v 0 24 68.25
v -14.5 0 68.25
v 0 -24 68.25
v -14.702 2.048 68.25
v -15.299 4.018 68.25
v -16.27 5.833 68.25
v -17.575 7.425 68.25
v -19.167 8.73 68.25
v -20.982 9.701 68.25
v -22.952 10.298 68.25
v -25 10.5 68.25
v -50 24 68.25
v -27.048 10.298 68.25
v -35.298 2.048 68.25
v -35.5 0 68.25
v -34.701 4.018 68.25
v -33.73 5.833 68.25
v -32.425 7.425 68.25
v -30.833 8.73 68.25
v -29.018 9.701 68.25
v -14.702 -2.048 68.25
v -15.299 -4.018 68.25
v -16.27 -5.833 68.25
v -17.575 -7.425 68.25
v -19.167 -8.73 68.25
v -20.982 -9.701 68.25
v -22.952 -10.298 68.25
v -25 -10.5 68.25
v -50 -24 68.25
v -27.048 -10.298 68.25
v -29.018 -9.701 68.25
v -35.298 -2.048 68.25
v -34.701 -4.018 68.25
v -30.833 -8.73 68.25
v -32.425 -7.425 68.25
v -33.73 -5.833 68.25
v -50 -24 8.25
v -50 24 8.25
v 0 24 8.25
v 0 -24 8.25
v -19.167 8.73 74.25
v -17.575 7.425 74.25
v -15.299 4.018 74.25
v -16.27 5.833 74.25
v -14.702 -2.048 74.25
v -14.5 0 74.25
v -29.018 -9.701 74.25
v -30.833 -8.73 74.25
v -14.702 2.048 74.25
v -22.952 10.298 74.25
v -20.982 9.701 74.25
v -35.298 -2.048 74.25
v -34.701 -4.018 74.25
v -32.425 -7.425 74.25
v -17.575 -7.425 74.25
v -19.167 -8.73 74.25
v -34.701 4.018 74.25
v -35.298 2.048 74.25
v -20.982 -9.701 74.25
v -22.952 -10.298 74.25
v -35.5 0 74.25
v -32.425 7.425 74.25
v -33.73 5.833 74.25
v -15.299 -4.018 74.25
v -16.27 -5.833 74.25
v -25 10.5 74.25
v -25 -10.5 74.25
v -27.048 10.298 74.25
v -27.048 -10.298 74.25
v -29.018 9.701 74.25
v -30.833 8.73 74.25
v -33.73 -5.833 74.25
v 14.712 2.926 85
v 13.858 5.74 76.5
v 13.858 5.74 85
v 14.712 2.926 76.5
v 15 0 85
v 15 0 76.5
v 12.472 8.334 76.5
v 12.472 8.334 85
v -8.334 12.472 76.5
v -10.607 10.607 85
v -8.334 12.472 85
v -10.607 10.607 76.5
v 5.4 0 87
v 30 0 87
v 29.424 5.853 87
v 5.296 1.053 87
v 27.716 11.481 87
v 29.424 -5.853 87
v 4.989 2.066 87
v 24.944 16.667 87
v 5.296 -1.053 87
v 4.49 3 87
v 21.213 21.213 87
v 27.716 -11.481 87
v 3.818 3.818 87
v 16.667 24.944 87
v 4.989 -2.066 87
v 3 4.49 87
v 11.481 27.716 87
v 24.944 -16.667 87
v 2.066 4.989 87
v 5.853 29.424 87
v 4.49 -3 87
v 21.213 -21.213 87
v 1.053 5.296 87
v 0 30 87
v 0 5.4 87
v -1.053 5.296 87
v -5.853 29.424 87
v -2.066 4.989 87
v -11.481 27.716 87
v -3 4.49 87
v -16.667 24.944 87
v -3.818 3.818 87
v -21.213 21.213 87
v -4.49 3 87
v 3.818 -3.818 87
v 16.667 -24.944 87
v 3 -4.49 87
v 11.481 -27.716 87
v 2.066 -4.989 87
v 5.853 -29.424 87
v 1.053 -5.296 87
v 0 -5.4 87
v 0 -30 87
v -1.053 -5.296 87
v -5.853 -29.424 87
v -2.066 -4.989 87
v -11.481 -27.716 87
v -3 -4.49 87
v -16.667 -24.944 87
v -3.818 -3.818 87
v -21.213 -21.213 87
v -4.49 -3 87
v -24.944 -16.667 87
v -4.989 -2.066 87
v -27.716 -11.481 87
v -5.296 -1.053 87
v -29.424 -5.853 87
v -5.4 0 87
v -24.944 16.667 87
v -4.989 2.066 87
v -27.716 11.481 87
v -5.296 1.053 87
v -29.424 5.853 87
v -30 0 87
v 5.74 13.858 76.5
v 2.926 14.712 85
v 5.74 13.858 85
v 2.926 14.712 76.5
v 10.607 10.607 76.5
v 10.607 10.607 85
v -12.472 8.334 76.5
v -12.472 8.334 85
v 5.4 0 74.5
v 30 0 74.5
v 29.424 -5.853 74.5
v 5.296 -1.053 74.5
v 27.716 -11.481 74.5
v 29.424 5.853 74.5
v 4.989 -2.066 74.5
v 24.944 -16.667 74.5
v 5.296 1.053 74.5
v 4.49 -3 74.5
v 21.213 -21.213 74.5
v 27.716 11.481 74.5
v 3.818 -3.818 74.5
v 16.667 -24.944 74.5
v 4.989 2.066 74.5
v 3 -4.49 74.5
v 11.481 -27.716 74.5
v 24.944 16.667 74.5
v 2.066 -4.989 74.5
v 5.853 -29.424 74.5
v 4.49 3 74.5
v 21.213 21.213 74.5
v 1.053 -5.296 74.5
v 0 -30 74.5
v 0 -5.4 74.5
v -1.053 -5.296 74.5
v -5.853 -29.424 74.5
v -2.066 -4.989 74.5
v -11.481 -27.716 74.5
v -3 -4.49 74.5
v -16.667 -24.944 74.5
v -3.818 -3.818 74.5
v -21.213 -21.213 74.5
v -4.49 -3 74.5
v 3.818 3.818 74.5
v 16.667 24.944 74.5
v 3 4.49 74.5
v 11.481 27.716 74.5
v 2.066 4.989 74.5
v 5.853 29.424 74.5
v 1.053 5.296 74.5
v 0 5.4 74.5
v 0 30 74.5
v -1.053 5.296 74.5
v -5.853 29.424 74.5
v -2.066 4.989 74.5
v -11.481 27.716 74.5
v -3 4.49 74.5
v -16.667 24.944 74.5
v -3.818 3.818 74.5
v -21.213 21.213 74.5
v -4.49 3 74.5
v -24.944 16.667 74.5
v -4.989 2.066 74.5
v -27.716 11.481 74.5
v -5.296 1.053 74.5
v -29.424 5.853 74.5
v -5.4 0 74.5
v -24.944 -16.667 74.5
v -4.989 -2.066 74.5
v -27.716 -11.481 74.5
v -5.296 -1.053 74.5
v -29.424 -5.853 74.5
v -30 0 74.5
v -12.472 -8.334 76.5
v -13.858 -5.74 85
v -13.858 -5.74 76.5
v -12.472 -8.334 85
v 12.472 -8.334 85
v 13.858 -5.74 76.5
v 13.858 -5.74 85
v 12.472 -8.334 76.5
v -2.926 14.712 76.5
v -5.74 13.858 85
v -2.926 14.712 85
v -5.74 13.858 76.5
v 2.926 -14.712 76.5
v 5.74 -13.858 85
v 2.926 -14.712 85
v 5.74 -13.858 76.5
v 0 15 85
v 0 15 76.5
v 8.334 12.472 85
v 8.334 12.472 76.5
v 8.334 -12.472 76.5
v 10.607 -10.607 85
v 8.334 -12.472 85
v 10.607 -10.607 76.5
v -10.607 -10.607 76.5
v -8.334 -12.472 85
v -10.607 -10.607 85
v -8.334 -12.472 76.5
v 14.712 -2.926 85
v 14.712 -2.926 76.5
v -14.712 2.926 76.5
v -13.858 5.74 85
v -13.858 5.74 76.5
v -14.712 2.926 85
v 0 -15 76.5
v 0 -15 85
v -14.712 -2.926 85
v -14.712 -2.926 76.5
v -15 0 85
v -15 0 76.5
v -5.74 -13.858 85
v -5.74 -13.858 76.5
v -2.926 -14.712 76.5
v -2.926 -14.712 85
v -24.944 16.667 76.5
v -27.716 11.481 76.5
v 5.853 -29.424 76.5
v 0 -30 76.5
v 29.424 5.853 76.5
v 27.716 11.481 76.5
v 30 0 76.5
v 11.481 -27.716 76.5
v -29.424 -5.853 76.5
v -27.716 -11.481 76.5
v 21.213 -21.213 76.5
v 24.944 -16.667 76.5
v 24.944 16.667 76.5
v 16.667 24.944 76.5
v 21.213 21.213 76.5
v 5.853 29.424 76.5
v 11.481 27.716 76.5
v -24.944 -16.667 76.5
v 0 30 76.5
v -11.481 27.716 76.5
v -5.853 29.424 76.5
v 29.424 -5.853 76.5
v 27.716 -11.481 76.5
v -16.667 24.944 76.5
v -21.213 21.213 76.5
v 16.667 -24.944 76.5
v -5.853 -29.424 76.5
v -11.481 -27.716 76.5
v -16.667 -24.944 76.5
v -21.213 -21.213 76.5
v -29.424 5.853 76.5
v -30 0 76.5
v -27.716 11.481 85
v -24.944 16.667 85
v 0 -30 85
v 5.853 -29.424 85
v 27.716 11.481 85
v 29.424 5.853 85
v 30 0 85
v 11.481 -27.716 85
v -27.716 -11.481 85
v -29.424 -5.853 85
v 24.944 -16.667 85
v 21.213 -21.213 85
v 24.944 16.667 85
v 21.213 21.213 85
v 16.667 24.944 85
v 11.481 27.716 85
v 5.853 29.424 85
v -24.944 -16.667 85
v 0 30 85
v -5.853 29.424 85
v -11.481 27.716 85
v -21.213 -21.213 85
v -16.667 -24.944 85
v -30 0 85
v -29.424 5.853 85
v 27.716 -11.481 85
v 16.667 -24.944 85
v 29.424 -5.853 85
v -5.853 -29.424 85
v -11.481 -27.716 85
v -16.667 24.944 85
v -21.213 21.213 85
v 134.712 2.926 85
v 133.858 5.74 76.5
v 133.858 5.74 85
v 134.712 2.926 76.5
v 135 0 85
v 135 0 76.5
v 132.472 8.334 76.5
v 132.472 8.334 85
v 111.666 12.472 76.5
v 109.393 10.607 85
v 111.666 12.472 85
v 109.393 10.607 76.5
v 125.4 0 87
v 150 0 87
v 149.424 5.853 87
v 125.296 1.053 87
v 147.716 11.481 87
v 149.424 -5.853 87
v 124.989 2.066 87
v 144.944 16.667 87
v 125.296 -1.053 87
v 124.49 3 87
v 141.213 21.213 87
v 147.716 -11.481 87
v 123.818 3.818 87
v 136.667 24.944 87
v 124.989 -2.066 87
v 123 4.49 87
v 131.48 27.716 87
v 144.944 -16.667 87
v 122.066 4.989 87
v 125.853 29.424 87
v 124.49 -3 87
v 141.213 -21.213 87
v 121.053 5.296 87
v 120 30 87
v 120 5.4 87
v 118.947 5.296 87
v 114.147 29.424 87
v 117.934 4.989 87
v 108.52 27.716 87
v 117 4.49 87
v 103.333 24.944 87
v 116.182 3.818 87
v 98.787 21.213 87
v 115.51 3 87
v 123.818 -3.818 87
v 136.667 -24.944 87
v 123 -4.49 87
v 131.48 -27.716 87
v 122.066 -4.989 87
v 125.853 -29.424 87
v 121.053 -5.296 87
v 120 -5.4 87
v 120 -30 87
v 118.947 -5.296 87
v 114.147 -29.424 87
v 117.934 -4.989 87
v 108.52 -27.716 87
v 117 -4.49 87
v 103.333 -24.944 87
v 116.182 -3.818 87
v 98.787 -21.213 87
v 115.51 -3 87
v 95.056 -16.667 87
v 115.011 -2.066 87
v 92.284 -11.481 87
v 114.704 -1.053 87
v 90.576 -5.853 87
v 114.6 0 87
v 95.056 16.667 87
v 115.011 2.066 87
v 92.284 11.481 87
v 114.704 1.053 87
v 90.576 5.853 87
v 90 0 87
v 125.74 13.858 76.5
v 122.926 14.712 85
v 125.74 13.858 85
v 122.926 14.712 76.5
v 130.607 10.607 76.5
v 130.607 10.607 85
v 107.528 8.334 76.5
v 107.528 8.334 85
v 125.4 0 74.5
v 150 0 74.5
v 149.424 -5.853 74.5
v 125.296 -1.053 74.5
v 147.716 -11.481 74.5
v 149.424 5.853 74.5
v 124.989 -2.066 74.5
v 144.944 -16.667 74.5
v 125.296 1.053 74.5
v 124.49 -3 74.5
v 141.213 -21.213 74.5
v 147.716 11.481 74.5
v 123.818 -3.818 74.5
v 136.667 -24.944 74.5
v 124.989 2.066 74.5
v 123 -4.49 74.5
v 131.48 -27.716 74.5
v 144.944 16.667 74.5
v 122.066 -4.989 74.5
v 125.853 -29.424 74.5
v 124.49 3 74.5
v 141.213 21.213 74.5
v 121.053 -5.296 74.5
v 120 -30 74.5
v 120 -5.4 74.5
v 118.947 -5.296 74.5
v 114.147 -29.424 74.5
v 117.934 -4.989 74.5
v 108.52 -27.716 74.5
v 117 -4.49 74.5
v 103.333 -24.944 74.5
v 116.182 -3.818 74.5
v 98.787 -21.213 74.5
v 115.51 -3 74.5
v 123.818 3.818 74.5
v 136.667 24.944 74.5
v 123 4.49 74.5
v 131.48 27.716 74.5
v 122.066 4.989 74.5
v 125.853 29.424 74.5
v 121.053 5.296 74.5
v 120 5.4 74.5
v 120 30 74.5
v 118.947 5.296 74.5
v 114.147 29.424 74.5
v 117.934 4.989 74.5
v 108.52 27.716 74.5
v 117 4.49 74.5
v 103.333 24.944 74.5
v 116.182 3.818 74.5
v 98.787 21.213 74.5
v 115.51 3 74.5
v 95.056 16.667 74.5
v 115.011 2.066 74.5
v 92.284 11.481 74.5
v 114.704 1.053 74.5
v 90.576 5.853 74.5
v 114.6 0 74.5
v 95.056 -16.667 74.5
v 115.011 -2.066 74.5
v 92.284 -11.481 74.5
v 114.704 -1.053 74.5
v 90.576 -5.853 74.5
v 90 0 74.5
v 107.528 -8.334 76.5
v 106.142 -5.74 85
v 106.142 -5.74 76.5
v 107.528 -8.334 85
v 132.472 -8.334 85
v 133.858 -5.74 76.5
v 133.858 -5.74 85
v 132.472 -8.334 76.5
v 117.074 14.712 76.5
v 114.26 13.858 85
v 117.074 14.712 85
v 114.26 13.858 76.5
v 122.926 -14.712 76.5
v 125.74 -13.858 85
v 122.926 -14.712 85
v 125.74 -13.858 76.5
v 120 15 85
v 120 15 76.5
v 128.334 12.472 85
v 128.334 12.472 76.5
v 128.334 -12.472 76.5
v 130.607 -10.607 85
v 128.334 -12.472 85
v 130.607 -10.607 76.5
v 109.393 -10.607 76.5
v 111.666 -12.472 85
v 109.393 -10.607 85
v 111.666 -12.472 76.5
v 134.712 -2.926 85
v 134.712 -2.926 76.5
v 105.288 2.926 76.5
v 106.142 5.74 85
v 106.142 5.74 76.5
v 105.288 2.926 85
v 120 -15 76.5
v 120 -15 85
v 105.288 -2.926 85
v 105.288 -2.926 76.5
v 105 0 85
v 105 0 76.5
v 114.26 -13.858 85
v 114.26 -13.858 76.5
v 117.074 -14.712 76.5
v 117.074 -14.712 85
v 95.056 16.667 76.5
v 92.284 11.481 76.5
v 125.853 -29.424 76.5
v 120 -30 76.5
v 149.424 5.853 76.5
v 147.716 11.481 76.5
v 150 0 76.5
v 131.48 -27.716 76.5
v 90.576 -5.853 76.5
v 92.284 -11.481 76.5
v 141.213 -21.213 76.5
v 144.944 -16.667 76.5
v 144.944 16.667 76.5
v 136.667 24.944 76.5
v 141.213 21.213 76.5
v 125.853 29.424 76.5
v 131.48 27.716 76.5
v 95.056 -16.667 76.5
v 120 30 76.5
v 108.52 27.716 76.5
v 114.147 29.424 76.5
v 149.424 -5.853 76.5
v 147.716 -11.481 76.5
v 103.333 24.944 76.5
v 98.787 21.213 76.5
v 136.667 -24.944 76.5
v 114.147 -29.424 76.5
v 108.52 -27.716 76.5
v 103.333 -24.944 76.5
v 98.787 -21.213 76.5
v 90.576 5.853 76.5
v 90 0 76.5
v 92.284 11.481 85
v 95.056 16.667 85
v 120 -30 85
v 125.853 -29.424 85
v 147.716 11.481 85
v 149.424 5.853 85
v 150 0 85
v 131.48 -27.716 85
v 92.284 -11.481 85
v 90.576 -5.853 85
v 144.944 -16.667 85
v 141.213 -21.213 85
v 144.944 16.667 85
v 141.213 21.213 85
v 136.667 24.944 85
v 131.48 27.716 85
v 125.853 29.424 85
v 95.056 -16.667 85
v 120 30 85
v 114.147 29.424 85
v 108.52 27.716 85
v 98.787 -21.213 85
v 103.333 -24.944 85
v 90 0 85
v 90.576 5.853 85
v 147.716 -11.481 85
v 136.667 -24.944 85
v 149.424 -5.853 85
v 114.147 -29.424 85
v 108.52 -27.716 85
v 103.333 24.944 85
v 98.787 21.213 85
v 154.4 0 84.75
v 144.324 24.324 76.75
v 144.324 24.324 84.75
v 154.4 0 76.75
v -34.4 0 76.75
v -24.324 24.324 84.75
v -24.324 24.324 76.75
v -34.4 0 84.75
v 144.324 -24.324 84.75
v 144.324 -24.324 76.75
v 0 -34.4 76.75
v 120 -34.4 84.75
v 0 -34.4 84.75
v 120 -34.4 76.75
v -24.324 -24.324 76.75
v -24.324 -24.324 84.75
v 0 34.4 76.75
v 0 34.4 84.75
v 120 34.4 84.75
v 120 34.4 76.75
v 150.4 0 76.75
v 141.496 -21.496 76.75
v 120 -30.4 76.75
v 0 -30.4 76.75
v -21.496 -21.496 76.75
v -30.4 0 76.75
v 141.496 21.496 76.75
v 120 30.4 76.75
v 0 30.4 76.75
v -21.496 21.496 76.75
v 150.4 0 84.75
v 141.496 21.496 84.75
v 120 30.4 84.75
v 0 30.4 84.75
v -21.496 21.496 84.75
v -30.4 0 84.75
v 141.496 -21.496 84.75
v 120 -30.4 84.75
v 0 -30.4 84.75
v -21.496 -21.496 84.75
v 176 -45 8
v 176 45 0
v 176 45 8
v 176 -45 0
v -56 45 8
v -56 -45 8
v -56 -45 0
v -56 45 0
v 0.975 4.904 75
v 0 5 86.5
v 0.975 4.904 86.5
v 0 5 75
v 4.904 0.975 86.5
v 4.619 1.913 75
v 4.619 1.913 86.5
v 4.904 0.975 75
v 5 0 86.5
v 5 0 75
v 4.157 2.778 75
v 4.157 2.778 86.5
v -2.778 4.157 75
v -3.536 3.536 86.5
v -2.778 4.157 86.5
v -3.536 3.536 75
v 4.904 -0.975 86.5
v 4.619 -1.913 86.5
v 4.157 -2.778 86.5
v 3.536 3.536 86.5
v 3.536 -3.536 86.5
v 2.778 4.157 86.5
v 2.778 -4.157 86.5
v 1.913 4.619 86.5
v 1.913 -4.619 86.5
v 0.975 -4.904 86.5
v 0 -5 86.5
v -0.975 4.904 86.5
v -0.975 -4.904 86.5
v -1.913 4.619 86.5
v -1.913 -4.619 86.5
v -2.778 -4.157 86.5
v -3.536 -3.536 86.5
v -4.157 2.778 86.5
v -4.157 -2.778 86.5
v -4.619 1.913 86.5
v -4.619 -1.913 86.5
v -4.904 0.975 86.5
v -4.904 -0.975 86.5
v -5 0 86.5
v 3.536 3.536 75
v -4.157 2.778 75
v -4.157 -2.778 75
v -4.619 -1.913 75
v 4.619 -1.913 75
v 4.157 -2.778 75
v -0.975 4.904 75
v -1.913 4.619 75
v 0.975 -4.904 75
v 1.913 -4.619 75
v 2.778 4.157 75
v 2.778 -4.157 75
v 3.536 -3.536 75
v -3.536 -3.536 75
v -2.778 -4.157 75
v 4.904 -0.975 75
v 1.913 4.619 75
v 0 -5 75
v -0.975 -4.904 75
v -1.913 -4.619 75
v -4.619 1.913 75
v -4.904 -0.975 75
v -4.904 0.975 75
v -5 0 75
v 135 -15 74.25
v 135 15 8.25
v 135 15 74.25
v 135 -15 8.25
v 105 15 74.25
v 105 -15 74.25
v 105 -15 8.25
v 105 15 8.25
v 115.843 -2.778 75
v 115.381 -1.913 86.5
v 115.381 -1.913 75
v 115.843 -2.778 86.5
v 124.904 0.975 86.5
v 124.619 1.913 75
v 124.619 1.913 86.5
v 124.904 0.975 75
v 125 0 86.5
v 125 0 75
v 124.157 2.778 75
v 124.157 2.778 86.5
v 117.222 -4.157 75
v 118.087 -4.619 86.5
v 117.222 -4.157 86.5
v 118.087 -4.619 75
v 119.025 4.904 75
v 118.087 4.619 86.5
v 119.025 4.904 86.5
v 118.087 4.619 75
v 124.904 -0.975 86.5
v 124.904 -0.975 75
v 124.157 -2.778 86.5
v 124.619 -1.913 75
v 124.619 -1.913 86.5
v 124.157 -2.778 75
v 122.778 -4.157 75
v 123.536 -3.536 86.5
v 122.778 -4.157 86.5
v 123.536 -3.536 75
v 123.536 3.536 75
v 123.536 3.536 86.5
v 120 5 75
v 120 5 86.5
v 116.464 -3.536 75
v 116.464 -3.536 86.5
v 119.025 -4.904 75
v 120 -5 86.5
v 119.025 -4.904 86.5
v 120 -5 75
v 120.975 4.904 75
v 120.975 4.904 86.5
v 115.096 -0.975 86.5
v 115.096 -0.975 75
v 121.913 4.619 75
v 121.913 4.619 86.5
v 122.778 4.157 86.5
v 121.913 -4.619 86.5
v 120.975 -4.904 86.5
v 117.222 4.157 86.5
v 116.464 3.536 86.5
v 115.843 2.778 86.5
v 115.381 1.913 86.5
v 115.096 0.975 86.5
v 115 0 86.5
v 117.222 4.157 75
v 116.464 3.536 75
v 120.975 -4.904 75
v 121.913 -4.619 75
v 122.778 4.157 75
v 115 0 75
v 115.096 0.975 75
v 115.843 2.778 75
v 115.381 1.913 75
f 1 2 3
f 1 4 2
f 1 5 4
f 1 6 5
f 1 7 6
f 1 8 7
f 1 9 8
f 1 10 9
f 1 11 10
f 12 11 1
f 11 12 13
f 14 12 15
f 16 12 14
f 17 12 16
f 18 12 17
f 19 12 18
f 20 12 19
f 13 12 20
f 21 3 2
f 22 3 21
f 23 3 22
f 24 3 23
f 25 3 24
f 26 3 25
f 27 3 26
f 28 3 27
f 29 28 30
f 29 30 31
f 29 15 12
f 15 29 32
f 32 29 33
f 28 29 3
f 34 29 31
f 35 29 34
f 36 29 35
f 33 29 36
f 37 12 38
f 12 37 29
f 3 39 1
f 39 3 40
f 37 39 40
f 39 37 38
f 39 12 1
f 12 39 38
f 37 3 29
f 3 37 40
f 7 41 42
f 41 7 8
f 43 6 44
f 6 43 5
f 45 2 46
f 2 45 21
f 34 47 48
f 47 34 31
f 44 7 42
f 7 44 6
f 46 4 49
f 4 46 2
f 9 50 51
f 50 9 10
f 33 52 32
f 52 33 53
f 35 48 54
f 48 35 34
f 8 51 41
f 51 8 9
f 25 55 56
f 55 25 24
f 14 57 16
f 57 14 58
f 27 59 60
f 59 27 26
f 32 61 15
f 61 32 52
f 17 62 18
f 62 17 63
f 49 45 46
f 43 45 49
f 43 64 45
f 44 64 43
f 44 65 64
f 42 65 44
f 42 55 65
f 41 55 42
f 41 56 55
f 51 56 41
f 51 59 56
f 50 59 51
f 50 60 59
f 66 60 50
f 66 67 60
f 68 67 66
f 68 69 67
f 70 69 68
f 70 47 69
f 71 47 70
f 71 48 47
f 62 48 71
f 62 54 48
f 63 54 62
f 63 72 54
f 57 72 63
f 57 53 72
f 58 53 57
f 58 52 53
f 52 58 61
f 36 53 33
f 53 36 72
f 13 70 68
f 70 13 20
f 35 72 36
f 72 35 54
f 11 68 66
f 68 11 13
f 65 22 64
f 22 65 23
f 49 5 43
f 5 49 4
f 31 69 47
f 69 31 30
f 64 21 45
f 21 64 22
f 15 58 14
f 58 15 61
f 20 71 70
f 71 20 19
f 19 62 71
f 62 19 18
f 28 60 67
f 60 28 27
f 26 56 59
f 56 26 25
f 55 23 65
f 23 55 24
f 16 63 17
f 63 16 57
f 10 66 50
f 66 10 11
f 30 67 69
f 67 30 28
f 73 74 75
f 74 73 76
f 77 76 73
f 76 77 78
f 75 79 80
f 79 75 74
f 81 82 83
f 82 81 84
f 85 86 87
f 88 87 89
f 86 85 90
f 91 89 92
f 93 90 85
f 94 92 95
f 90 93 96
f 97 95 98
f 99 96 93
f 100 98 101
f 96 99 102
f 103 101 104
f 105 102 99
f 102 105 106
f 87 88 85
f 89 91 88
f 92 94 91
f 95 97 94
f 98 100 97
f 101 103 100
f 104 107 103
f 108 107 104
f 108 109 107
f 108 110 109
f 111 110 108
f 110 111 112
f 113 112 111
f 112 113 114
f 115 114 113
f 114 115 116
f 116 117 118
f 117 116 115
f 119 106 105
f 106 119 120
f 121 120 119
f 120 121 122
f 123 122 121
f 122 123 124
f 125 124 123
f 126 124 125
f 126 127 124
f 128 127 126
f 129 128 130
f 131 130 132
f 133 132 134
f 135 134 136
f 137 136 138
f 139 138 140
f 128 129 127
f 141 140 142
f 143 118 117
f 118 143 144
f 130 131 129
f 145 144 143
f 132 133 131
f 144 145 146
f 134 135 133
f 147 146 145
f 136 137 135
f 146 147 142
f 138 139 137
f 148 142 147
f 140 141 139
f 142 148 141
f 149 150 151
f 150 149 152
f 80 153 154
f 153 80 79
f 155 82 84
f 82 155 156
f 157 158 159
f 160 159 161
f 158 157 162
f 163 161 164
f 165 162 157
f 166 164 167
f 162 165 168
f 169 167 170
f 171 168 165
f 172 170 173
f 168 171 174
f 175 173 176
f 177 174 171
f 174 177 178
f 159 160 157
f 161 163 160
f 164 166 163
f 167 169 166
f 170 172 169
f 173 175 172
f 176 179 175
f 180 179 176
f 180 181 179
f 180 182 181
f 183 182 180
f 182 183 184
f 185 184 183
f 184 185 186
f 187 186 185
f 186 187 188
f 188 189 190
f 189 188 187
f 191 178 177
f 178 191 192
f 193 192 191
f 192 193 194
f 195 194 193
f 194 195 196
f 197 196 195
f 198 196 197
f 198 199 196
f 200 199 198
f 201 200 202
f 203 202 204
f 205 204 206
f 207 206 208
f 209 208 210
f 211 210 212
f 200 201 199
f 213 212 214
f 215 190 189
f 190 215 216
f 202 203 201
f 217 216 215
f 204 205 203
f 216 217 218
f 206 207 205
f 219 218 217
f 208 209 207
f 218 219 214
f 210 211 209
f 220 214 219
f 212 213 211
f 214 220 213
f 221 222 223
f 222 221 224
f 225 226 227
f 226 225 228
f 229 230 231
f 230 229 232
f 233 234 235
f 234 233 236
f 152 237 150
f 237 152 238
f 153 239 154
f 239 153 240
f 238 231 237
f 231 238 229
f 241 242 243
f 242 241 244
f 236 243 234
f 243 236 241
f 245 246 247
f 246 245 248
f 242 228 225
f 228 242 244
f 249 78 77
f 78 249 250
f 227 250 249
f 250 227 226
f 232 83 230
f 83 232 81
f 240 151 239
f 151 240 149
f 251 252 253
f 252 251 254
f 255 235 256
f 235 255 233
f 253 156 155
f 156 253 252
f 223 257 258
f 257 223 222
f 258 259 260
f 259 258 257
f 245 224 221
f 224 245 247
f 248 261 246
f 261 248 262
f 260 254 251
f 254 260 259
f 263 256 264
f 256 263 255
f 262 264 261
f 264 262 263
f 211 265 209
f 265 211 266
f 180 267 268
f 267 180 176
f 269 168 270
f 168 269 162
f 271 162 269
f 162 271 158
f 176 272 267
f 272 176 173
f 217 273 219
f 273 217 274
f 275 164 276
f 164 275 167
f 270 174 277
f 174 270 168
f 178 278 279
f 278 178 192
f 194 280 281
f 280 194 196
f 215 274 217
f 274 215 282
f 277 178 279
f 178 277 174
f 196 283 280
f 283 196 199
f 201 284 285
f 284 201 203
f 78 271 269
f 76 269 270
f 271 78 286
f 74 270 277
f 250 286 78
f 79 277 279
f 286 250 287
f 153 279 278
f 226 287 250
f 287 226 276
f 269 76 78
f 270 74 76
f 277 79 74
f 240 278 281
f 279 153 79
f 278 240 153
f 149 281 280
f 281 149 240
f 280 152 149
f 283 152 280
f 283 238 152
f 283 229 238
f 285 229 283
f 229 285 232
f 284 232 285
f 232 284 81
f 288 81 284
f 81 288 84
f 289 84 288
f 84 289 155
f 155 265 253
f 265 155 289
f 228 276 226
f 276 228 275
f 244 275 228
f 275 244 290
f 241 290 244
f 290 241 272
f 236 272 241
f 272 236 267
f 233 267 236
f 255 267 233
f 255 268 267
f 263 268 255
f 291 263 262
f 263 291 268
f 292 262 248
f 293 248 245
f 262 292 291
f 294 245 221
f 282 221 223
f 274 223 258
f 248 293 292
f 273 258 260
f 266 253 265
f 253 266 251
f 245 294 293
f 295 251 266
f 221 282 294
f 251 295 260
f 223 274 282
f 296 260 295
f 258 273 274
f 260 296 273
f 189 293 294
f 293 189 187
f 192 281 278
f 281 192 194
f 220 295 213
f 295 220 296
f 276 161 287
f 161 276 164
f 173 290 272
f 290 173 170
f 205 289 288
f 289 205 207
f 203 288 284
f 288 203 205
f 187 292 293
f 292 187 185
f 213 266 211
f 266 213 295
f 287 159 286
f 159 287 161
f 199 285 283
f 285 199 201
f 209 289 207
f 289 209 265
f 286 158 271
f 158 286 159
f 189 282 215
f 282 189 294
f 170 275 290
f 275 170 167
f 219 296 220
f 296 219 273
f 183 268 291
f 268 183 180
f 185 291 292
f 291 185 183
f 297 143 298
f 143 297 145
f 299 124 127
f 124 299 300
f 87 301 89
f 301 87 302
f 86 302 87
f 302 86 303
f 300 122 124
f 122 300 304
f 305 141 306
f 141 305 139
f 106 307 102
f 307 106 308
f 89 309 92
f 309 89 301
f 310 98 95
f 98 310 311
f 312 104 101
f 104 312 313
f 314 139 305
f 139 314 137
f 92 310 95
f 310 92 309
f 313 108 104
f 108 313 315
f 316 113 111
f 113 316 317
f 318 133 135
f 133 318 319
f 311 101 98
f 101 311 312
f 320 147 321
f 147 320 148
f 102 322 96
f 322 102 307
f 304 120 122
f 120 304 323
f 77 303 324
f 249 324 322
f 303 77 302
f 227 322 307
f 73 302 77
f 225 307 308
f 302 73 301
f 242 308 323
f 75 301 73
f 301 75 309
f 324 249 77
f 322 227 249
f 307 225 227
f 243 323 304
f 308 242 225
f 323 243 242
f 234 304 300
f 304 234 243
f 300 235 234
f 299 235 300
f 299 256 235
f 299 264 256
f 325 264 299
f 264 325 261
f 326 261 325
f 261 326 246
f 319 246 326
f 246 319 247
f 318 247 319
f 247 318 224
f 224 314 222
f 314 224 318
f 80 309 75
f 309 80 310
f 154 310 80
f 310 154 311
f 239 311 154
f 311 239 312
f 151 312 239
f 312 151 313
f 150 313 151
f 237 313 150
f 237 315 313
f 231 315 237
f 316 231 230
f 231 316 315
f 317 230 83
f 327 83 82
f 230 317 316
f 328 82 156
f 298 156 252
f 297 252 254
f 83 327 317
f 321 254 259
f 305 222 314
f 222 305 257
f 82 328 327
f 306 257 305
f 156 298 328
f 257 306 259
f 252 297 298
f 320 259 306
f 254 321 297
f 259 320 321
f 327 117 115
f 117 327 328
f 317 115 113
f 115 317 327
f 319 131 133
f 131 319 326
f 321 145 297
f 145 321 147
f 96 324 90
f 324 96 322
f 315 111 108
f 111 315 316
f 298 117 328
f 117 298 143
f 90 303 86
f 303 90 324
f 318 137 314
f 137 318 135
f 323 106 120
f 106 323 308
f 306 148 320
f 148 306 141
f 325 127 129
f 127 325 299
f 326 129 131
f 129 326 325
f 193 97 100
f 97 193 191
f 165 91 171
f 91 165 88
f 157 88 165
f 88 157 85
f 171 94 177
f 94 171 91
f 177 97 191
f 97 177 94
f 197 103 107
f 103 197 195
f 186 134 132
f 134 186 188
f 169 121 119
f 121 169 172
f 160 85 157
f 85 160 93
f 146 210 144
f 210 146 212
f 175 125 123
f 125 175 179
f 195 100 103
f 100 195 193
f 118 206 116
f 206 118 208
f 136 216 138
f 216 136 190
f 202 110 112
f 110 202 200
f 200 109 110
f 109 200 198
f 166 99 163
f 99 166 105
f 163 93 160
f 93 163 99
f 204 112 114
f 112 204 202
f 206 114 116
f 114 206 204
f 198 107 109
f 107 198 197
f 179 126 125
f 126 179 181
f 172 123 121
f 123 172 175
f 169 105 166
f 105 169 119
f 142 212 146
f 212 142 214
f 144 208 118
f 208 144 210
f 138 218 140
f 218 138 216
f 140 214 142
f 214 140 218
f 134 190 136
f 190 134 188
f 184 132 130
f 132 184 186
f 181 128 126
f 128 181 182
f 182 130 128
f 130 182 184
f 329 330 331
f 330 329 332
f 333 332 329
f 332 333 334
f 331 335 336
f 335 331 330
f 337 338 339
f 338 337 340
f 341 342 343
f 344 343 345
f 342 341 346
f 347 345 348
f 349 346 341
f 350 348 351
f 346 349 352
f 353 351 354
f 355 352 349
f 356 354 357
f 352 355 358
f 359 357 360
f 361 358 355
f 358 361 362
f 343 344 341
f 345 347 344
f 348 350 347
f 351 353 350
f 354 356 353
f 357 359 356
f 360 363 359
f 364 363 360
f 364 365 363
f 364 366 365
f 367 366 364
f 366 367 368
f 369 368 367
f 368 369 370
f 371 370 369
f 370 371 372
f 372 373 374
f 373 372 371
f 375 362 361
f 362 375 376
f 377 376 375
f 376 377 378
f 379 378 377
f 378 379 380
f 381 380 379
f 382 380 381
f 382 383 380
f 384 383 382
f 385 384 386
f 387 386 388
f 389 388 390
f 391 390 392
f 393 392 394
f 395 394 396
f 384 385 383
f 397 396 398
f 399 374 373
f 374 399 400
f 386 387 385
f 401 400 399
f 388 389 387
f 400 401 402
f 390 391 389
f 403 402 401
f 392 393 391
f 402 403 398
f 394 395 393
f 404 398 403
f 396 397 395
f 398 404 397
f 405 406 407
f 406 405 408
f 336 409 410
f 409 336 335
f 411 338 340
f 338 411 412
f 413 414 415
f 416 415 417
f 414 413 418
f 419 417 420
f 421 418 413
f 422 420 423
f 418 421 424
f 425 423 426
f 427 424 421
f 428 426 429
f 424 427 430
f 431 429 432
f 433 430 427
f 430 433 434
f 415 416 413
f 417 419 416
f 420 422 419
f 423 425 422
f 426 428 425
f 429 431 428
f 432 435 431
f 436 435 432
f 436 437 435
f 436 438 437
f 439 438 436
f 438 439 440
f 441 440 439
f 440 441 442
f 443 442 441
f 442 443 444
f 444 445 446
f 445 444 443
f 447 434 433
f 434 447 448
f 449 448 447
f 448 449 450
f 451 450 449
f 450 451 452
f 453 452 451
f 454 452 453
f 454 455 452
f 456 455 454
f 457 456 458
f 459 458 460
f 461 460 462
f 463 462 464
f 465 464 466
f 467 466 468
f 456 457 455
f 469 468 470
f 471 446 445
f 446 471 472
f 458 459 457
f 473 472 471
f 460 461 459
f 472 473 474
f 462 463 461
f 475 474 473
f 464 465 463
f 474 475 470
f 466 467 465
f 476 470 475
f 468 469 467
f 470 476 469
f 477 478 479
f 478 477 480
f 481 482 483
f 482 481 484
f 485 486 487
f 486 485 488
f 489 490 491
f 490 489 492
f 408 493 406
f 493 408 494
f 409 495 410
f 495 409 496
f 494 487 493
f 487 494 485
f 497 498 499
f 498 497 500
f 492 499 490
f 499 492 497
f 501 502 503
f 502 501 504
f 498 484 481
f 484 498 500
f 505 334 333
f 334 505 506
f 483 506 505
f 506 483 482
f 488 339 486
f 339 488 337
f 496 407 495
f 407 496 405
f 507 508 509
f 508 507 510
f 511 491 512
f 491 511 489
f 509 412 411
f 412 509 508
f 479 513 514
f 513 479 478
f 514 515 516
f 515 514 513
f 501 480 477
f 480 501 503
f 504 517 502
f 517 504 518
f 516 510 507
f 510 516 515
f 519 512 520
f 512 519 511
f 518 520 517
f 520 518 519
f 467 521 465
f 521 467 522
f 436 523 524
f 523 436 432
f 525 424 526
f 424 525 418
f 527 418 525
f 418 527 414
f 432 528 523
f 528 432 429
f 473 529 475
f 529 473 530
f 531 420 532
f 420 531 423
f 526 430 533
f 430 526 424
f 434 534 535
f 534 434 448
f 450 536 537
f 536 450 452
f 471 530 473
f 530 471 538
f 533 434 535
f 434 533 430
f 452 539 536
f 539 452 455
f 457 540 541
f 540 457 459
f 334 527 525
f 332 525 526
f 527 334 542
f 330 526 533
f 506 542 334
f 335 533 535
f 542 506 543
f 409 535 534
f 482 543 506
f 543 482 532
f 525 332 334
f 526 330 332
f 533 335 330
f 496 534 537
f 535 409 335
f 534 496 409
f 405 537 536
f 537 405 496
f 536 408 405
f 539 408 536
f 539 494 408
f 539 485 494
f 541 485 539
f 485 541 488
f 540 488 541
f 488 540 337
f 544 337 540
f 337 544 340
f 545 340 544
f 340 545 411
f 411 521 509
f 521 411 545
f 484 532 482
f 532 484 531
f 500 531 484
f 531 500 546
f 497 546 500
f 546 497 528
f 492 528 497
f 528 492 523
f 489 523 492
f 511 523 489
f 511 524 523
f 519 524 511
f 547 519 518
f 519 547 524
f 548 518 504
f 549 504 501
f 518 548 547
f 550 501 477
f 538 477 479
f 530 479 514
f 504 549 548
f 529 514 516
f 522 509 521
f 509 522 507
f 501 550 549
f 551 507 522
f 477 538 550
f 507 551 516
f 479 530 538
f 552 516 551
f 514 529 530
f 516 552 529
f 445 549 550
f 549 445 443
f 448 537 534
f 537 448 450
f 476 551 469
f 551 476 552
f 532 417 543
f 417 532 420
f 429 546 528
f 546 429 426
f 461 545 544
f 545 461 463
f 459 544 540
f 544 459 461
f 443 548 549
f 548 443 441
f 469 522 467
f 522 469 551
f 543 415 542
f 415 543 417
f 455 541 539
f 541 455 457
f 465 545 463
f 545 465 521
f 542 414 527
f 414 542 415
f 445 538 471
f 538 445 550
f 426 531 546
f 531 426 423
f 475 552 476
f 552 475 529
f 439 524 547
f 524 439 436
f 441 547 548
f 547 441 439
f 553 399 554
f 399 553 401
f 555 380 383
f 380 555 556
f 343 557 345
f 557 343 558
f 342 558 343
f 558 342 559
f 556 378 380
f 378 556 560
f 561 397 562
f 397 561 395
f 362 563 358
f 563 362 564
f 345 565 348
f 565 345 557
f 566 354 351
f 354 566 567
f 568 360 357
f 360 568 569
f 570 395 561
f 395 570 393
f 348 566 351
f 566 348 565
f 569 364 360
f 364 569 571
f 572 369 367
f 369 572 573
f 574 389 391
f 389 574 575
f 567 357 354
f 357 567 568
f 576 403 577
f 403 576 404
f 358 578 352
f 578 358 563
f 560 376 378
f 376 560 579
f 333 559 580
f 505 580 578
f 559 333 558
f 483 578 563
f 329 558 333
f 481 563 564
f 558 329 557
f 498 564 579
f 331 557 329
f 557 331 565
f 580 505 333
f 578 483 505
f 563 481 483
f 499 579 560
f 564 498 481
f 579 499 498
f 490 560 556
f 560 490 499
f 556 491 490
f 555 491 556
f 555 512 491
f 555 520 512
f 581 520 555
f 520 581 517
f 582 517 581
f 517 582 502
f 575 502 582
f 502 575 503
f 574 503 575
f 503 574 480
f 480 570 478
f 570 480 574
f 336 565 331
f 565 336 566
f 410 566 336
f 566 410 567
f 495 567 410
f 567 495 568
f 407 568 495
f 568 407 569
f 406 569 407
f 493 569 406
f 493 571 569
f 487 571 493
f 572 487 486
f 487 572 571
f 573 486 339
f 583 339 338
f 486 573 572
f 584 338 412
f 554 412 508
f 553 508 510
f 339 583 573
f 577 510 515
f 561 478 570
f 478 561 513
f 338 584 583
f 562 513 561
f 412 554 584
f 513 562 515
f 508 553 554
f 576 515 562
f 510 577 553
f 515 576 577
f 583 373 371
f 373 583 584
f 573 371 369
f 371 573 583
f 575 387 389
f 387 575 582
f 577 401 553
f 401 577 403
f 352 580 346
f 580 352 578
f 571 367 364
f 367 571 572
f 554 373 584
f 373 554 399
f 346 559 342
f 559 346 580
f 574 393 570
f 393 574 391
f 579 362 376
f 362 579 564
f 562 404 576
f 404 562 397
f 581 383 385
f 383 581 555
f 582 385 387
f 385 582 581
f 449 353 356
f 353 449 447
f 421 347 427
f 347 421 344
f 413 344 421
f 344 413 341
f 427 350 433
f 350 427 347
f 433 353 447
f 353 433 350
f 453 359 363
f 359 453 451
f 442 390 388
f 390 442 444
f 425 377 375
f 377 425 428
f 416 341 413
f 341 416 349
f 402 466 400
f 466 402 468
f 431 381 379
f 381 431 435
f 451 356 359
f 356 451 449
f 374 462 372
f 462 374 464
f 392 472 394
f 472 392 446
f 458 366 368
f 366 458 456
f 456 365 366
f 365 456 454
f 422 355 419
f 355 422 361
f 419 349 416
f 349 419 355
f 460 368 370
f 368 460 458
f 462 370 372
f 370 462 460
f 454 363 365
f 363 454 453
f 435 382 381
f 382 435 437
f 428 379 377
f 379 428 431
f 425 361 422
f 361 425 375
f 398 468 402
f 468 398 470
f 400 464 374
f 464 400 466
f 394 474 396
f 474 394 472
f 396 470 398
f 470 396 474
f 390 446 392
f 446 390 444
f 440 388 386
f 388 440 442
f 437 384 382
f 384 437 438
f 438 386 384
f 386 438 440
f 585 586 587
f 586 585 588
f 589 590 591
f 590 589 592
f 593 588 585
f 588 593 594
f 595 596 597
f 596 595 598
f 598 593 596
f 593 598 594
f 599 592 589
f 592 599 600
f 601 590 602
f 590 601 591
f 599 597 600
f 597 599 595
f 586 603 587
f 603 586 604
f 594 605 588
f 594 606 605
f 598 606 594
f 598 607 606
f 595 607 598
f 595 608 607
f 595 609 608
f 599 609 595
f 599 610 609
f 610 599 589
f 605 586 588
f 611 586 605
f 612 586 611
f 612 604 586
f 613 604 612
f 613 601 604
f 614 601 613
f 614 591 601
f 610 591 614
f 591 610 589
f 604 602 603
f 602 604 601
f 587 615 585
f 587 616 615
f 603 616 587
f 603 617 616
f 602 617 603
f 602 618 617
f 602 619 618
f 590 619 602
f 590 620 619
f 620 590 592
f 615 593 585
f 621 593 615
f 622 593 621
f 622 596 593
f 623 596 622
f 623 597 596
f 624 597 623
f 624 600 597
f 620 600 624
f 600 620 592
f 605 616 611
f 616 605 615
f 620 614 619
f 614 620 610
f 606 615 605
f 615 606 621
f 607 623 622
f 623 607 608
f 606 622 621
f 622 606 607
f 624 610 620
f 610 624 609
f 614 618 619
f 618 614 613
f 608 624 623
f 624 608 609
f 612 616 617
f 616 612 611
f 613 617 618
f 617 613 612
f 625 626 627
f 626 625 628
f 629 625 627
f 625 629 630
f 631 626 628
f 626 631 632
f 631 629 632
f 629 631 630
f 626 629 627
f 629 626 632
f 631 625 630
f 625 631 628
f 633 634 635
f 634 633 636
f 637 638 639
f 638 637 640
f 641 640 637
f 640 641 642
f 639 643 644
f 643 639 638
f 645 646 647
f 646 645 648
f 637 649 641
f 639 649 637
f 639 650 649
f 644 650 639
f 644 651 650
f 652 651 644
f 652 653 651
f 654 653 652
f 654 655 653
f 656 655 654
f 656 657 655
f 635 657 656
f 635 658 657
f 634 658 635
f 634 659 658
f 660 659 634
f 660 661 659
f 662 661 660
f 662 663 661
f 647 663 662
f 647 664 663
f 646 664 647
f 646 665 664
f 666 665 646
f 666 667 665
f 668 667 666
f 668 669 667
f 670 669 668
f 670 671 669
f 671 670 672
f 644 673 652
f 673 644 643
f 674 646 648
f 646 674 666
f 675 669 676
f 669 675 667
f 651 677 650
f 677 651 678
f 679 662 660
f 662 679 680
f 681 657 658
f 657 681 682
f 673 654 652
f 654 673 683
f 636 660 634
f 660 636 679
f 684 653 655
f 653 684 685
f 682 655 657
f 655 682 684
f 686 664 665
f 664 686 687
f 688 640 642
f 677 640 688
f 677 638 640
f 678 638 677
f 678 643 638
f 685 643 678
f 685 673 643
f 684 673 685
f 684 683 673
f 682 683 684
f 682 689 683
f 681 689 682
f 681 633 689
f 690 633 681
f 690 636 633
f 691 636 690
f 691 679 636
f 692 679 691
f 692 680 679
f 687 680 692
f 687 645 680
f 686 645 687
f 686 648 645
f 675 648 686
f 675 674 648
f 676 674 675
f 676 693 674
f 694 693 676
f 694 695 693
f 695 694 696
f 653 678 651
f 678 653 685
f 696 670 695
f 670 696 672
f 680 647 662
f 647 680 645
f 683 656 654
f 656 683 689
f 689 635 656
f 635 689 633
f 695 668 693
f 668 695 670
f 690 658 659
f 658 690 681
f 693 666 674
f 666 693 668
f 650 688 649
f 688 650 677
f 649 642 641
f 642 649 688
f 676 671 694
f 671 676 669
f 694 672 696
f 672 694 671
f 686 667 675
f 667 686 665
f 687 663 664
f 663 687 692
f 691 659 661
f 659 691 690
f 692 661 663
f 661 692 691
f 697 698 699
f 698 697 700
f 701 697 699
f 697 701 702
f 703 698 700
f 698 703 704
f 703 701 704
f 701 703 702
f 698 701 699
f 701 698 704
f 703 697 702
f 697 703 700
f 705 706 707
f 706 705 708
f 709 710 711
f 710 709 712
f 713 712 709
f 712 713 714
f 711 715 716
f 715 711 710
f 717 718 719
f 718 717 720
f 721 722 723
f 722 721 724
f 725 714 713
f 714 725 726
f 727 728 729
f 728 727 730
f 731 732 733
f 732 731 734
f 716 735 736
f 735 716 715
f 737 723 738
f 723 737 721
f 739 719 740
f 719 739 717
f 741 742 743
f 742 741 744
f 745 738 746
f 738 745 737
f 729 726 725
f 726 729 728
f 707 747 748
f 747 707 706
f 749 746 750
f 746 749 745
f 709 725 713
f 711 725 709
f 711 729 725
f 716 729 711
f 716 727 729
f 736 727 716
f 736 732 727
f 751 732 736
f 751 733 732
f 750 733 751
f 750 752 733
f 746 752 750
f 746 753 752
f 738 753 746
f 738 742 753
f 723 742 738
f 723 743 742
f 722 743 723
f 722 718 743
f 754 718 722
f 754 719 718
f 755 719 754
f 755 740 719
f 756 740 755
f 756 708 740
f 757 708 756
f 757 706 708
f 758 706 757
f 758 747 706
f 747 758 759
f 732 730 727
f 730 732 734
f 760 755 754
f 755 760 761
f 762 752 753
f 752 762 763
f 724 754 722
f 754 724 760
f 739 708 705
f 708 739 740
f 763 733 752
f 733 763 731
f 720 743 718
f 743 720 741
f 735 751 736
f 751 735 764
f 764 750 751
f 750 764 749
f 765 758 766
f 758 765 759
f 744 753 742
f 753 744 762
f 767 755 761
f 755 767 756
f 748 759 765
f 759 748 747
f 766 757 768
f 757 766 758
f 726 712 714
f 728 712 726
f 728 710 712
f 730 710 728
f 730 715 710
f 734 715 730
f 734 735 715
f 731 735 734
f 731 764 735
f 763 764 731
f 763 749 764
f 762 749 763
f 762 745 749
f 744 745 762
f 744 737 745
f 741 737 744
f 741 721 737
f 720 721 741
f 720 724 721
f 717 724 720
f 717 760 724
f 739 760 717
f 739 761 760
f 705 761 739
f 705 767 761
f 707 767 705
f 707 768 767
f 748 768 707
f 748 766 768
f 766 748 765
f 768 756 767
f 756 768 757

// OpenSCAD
$fn = 32;

// ------------------------------------------------------------------------
// Motor belt drive: span 120 mm, pulleys d60, belt 8 mm wide
// Every part is its own module, assembly() places every instance.
// ------------------------------------------------------------------------

// --- part 1 ---
module base_plate() {
  difference() {
    translate([-116, -45, 0]) cube([232, 90, 8]);
  }
}

// --- part 2 ---
module motor() {
  union() {
    translate([-30, -24, 0]) cube([60, 48, 50]);
    translate([33, 0, 25]) rotate([0, 90, 0]) cylinder(h = 6, d = 21, center = true);
  }
}

// --- part 3 ---
module drive_shaft() {
  translate([0, 0, -5.75]) cylinder(h = 11.5, d = 10);
}

// --- part 4 ---
module pulley_drive() {
  difference() {
    union() {
      cylinder(h = 12.5, d = 30);
      cylinder(h = 2, d = 60);
      translate([0, 0, 10.5]) cylinder(h = 2, d = 60);
    }
    translate([0, 0, -1]) cylinder(h = 14.5, d = 10.8);
  }
}

// --- part 5 ---
module idler_post() {
  translate([-15, -15, 0]) cube([30, 30, 66]);
}

// --- part 6 ---
module driven_shaft() {
  translate([0, 0, -5.75]) cylinder(h = 11.5, d = 10);
}

// --- part 7 ---
module pulley_driven() {
  difference() {
    union() {
      cylinder(h = 12.5, d = 30);
      cylinder(h = 2, d = 60);
      translate([0, 0, 10.5]) cylinder(h = 2, d = 60);
    }
    translate([0, 0, -1]) cylinder(h = 14.5, d = 10.8);
  }
}

// --- part 8 ---
module drive_belt() {
  difference() {
    linear_extrude(height = 8) polygon(points = concat([for (a = [90 : 45 : 270]) [34.4 * cos(a), 34.4 * sin(a)]], [for (a = [270 : 45 : 450]) [120 + 34.4 * cos(a), 34.4 * sin(a)]]));
    translate([0, 0, -1]) linear_extrude(height = 10) polygon(points = concat([for (a = [90 : 45 : 270]) [30.4 * cos(a), 30.4 * sin(a)]], [for (a = [270 : 45 : 450]) [120 + 30.4 * cos(a), 30.4 * sin(a)]]));
  }
}

// --- assembly ---
module assembly() {
  color([0.80, 0.24, 0.20]) translate([60, 0, 0]) rotate([0, 0, 0]) base_plate();
  color([0.20, 0.45, 0.75]) translate([0, 0, 38.25]) rotate([0, 270, 0]) motor();
  color([0.25, 0.62, 0.32]) translate([0, 0, 80.75]) rotate([0, 0, 0]) drive_shaft();
  color([0.92, 0.70, 0.18]) translate([0, 0, 74.5]) rotate([0, 0, 0]) pulley_drive();
  color([0.58, 0.35, 0.70]) translate([120, 0, 8.25]) rotate([0, 0, 0]) idler_post();
  color([0.16, 0.66, 0.66]) translate([120, 0, 80.75]) rotate([0, 0, 0]) driven_shaft();
  color([0.85, 0.48, 0.18]) translate([120, 0, 74.5]) rotate([0, 0, 0]) pulley_driven();
  color([0.55, 0.60, 0.65]) translate([0, 0, 76.75]) rotate([0, 0, 0]) drive_belt();
}

assembly();
